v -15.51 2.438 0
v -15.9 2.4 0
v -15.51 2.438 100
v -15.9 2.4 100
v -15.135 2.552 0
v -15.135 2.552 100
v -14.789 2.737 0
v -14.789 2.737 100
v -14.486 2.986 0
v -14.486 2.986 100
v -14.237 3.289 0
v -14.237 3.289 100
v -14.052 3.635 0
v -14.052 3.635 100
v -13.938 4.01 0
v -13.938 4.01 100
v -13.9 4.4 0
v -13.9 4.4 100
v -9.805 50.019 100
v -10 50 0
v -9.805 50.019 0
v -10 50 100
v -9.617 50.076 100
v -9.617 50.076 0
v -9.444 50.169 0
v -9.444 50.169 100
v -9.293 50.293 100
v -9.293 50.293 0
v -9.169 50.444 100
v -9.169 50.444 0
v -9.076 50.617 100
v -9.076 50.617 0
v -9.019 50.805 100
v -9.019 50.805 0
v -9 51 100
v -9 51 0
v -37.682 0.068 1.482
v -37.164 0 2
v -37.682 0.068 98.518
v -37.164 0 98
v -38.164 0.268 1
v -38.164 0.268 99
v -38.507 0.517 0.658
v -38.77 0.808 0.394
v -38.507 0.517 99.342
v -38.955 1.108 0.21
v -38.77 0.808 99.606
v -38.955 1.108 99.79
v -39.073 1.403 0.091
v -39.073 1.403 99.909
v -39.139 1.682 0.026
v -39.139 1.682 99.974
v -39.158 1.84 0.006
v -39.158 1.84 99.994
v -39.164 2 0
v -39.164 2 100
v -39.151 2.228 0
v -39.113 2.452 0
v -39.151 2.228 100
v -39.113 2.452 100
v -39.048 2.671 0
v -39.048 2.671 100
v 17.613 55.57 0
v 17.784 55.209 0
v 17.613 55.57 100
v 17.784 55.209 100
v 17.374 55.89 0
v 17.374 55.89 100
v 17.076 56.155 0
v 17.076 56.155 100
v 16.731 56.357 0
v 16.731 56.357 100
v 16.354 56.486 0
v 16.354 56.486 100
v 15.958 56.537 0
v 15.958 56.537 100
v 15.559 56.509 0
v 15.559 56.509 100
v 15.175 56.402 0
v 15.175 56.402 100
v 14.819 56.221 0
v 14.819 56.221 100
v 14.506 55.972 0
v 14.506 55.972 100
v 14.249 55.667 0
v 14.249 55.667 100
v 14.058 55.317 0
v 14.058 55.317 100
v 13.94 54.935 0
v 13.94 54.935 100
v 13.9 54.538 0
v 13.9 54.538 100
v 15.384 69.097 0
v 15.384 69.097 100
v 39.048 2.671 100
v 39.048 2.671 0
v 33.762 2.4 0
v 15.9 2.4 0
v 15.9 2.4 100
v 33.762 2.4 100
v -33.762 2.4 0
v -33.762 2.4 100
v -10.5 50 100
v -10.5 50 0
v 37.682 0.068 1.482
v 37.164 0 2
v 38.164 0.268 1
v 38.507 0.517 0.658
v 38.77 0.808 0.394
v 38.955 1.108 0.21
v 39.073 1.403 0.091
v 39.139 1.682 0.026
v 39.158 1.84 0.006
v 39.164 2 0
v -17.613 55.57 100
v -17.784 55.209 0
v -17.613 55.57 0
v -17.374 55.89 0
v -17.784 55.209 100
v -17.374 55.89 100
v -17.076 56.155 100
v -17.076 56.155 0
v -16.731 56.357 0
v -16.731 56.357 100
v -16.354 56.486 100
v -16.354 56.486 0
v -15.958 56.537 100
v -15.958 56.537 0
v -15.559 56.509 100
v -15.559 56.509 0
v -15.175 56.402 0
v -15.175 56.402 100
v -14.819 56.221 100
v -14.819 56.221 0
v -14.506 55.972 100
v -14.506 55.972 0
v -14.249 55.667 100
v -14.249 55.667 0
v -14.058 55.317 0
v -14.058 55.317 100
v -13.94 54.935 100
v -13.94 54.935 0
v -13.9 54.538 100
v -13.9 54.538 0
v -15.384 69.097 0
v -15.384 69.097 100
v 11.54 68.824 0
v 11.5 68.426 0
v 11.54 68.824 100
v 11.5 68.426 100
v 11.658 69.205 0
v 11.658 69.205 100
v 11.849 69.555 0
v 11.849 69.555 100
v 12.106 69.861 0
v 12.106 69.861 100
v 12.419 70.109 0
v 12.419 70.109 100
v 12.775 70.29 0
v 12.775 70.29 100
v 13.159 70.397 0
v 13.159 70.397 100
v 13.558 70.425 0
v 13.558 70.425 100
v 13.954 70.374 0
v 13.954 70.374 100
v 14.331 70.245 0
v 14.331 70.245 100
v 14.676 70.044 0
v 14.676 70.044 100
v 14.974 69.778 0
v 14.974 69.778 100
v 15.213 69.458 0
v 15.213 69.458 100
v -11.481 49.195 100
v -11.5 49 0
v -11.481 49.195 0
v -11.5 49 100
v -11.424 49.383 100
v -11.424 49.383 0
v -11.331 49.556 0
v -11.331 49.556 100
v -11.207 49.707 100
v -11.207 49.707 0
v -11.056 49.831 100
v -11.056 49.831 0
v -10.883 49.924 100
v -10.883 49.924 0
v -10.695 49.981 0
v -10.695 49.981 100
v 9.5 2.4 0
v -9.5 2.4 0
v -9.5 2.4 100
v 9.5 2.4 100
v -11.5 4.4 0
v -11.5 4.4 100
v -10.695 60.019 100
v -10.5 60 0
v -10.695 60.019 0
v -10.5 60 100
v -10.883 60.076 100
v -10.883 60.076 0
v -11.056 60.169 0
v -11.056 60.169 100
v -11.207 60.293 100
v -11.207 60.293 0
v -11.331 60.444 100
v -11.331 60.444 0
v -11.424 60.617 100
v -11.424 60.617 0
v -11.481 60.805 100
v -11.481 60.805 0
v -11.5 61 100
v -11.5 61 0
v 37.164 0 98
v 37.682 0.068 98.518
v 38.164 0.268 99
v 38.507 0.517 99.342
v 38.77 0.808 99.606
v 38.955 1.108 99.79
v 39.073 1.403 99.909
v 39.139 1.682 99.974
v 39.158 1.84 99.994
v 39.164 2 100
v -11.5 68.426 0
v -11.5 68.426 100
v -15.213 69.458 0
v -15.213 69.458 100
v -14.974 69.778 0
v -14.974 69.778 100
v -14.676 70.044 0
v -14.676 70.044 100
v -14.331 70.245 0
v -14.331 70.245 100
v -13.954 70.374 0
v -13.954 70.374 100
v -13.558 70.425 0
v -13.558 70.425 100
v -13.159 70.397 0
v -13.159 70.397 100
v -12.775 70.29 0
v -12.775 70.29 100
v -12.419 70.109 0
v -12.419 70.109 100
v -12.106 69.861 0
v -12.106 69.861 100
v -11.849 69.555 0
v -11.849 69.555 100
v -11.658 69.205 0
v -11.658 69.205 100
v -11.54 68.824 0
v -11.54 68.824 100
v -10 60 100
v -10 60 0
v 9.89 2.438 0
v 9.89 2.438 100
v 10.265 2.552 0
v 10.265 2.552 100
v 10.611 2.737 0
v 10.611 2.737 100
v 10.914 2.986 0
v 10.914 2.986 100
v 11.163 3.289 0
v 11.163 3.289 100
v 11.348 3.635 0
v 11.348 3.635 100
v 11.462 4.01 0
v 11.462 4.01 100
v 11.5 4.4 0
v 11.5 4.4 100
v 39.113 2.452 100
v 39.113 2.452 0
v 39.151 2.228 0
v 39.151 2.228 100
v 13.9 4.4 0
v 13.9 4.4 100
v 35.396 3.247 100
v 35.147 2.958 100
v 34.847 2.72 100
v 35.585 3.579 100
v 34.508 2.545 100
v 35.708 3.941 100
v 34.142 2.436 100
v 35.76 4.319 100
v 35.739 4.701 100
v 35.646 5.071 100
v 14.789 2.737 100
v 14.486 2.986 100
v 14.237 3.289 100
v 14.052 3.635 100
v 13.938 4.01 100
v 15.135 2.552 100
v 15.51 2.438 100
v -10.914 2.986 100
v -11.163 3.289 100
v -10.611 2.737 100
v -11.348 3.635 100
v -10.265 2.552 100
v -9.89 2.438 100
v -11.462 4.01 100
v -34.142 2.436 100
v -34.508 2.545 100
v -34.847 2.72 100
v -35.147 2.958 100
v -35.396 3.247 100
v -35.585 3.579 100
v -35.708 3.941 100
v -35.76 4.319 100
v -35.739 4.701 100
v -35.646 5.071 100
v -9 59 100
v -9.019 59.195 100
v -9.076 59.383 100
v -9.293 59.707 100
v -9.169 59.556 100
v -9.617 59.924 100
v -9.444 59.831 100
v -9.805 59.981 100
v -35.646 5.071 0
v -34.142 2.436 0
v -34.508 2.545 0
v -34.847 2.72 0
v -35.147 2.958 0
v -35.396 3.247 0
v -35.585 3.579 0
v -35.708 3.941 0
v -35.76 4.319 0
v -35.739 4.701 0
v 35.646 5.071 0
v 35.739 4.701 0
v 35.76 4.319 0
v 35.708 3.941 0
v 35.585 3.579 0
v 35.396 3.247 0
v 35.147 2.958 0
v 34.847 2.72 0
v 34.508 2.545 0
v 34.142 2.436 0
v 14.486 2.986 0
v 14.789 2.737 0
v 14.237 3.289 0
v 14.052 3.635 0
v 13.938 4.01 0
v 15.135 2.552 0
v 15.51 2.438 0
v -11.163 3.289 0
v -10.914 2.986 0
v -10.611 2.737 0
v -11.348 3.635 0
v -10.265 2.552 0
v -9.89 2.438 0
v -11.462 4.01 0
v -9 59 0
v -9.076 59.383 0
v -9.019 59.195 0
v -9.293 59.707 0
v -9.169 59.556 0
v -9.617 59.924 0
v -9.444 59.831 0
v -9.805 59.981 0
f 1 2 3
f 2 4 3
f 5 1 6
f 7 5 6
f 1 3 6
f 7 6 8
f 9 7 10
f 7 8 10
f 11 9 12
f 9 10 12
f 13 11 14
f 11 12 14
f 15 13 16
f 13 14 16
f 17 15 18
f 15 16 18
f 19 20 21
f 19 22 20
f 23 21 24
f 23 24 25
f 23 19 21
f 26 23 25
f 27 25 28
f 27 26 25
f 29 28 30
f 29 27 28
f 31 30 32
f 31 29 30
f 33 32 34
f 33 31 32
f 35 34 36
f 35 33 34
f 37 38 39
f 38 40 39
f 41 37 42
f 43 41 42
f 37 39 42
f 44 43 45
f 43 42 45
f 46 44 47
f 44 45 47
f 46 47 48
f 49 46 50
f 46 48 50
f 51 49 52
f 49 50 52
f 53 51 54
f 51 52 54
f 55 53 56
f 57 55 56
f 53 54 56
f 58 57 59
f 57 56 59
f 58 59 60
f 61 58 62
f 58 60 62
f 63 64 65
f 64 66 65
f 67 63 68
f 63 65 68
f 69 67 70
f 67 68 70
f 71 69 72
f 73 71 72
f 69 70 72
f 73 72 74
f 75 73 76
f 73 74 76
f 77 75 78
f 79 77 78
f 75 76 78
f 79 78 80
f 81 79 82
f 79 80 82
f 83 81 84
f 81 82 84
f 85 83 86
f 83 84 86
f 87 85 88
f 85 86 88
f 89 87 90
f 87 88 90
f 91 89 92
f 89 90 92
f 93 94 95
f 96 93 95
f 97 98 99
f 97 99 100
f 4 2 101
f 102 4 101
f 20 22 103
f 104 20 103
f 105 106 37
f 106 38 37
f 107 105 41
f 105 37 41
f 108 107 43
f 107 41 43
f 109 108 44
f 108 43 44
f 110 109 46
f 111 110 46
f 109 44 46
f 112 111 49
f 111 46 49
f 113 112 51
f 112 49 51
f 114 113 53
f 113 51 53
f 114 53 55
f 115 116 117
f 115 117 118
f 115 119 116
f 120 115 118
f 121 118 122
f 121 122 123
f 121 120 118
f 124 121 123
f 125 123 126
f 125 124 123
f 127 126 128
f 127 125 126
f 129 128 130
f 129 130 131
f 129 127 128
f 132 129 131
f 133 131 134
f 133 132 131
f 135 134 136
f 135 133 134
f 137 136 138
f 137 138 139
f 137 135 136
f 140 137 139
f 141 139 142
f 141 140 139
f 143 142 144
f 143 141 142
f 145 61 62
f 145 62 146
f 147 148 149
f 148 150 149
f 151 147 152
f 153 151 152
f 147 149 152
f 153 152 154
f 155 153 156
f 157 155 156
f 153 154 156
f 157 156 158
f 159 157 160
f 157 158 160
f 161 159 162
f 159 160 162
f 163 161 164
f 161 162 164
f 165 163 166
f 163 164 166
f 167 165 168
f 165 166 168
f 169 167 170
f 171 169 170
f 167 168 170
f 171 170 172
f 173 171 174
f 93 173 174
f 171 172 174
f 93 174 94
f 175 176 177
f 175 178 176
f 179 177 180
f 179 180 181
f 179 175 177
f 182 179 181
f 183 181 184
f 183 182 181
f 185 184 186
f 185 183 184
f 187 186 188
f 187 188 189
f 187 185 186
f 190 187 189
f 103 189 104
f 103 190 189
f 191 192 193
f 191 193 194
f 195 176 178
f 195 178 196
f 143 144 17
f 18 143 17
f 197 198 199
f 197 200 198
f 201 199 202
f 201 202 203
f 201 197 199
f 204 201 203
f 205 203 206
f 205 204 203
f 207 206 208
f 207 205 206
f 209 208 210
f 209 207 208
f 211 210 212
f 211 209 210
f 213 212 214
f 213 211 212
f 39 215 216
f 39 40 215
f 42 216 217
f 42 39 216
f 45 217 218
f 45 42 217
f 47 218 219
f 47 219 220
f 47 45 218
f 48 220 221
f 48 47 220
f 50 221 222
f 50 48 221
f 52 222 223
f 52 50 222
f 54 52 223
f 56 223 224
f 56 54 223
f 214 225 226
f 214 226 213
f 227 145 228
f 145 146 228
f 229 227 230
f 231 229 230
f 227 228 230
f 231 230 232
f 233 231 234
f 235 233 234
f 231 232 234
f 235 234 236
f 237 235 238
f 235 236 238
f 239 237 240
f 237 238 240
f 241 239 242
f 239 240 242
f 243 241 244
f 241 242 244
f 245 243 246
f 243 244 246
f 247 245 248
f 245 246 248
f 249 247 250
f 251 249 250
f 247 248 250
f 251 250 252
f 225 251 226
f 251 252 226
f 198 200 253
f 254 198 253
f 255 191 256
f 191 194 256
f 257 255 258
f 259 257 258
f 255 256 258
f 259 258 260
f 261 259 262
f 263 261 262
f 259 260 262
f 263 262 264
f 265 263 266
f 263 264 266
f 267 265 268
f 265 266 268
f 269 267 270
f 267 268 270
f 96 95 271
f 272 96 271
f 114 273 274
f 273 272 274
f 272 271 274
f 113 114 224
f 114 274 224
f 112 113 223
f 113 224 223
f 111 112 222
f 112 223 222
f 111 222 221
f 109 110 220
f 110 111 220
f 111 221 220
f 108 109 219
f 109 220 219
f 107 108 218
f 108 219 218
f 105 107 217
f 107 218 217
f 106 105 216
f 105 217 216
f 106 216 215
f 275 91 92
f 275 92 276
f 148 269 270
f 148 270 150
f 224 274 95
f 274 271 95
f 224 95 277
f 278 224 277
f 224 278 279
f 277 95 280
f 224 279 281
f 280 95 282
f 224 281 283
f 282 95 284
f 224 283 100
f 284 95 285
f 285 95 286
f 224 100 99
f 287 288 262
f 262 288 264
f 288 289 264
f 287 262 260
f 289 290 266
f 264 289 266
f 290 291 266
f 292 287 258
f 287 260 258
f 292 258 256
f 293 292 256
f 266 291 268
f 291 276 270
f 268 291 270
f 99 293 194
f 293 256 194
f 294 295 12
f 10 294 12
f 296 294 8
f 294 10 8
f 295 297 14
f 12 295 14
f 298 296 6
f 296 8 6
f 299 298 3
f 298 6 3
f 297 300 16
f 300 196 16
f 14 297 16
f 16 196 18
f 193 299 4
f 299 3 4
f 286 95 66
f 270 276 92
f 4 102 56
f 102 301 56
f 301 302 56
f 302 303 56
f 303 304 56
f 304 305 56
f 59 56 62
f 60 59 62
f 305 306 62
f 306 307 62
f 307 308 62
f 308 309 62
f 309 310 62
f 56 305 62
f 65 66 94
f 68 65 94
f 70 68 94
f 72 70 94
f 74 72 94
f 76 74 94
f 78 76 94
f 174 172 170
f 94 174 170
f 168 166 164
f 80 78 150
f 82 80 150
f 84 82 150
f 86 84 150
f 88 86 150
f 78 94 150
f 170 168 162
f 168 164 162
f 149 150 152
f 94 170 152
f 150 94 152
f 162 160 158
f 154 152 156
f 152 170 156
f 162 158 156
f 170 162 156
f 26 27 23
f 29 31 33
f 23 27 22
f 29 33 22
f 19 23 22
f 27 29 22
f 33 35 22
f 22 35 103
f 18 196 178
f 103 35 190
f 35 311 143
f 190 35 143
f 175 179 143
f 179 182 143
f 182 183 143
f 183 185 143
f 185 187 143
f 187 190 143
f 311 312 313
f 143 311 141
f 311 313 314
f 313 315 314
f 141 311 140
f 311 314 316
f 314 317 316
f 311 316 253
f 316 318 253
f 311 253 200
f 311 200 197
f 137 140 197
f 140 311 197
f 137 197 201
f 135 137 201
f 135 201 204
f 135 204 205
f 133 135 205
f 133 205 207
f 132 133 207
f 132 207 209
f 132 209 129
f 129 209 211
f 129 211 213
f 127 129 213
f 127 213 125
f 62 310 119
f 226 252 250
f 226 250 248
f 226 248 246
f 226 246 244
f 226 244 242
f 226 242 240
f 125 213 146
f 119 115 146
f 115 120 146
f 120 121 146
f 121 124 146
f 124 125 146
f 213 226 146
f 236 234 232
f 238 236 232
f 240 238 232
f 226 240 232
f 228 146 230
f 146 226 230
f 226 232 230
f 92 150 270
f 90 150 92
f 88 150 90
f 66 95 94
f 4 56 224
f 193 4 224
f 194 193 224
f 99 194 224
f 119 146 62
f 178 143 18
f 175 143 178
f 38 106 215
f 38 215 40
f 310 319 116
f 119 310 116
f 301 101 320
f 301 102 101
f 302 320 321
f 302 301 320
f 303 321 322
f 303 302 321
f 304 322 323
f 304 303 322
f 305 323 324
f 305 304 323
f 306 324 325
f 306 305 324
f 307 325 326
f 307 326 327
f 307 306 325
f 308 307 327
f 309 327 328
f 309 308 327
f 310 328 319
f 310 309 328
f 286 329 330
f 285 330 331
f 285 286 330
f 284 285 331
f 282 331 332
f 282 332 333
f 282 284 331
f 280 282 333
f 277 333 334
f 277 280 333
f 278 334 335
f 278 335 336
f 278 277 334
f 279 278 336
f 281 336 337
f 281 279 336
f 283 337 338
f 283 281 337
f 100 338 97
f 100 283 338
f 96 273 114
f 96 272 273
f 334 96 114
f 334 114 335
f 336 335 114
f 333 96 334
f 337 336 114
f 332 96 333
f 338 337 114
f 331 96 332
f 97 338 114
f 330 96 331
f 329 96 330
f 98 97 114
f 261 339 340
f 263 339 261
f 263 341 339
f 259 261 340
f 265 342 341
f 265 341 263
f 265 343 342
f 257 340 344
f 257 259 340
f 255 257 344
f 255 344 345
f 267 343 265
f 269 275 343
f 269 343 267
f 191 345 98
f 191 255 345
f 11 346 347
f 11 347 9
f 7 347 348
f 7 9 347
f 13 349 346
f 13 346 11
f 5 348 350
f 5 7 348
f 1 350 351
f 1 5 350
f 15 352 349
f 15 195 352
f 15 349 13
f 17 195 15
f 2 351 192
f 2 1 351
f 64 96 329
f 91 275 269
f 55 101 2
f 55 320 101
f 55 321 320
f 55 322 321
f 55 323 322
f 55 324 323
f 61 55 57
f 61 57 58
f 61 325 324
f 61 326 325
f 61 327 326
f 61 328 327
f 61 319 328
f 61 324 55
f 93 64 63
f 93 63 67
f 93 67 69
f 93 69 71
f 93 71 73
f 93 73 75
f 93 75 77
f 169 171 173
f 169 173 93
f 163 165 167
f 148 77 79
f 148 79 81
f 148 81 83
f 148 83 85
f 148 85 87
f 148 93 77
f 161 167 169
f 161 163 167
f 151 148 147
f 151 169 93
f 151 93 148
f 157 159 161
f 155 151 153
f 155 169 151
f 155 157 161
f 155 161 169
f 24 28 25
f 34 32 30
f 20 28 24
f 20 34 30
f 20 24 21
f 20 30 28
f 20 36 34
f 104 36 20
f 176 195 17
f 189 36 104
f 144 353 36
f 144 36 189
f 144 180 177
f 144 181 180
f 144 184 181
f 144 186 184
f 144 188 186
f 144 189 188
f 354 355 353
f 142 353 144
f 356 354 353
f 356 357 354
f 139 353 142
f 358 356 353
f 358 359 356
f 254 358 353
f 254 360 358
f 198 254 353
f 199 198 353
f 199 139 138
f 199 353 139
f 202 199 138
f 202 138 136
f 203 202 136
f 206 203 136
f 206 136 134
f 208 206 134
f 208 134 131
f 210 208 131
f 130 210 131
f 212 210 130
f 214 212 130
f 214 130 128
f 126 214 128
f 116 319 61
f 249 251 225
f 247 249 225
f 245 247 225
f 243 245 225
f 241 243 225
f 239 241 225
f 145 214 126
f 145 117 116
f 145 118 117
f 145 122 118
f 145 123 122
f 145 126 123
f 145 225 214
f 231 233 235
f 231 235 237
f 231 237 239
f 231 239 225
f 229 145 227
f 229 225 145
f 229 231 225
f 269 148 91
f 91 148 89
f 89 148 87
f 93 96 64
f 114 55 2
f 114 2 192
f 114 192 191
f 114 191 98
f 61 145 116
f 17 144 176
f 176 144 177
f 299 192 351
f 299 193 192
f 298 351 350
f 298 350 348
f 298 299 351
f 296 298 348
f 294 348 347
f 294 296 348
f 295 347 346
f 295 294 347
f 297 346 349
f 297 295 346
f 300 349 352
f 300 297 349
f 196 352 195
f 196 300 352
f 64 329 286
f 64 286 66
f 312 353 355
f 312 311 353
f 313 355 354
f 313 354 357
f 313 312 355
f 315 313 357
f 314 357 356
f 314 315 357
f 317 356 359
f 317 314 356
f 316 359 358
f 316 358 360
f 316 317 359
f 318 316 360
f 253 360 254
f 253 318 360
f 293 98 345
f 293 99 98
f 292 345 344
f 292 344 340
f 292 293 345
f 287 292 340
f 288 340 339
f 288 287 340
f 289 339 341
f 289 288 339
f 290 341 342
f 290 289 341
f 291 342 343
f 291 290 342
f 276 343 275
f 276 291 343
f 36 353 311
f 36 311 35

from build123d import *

# Parameters (mm, degrees)
BOSS_EXTRU_1_DEPTH = 100
CONG_1_R           = 2
CONG_2_R           = 1


with BuildPart() as part:
    # Esquisse1 → Boss.-Extru.1 (new body)
    with BuildSketch(Plane.XY):
        Polygon((-11.5, 2.4), (11.5, 2.4), (11.5, 80), (40, 0), (-40, 0), (-11.5, 80), (-11.5, 60), (-9, 60), (-9, 50), (-11.5, 50), align=None)
        Polygon((13.9, 66.111581736), (13.9, 2.4), (36.597250994, 2.4), align=None, mode=Mode.SUBTRACT)
        Polygon((-13.9, 2.4), (-36.597250994, 2.4), (-13.9, 66.111581736), align=None, mode=Mode.SUBTRACT)
    extrude(amount=BOSS_EXTRU_1_DEPTH)

    # Congé1
    cong_1_edges = [part.edges().sort_by_distance(p)[0] for p in [
        (0, 0, 0),
        (11.5, 80, 50),
        (40, 0, 50),
        (-40, 0, 50),
        (-11.5, 80, 50),
        (-11.5, 2.4, 50),
        (11.5, 2.4, 50),
        (36.597250994, 2.4, 50),
        (13.9, 66.111581736, 50),
        (13.9, 2.4, 50),
        (0, 0, 100),
        (-13.9, 2.4, 50),
        (-13.9, 66.111581736, 50),
        (-36.597250994, 2.4, 50),
    ]]
    fillet(cong_1_edges, radius=CONG_1_R)

    # Congé2
    cong_2_edges = [part.edges().sort_by_distance(p)[0] for p in [
        (-11.5, 60, 50),
        (-9, 60, 50),
        (-9, 50, 50),
        (-11.5, 50, 50),
    ]]
    fillet(cong_2_edges, radius=CONG_2_R)


solid = part.part
